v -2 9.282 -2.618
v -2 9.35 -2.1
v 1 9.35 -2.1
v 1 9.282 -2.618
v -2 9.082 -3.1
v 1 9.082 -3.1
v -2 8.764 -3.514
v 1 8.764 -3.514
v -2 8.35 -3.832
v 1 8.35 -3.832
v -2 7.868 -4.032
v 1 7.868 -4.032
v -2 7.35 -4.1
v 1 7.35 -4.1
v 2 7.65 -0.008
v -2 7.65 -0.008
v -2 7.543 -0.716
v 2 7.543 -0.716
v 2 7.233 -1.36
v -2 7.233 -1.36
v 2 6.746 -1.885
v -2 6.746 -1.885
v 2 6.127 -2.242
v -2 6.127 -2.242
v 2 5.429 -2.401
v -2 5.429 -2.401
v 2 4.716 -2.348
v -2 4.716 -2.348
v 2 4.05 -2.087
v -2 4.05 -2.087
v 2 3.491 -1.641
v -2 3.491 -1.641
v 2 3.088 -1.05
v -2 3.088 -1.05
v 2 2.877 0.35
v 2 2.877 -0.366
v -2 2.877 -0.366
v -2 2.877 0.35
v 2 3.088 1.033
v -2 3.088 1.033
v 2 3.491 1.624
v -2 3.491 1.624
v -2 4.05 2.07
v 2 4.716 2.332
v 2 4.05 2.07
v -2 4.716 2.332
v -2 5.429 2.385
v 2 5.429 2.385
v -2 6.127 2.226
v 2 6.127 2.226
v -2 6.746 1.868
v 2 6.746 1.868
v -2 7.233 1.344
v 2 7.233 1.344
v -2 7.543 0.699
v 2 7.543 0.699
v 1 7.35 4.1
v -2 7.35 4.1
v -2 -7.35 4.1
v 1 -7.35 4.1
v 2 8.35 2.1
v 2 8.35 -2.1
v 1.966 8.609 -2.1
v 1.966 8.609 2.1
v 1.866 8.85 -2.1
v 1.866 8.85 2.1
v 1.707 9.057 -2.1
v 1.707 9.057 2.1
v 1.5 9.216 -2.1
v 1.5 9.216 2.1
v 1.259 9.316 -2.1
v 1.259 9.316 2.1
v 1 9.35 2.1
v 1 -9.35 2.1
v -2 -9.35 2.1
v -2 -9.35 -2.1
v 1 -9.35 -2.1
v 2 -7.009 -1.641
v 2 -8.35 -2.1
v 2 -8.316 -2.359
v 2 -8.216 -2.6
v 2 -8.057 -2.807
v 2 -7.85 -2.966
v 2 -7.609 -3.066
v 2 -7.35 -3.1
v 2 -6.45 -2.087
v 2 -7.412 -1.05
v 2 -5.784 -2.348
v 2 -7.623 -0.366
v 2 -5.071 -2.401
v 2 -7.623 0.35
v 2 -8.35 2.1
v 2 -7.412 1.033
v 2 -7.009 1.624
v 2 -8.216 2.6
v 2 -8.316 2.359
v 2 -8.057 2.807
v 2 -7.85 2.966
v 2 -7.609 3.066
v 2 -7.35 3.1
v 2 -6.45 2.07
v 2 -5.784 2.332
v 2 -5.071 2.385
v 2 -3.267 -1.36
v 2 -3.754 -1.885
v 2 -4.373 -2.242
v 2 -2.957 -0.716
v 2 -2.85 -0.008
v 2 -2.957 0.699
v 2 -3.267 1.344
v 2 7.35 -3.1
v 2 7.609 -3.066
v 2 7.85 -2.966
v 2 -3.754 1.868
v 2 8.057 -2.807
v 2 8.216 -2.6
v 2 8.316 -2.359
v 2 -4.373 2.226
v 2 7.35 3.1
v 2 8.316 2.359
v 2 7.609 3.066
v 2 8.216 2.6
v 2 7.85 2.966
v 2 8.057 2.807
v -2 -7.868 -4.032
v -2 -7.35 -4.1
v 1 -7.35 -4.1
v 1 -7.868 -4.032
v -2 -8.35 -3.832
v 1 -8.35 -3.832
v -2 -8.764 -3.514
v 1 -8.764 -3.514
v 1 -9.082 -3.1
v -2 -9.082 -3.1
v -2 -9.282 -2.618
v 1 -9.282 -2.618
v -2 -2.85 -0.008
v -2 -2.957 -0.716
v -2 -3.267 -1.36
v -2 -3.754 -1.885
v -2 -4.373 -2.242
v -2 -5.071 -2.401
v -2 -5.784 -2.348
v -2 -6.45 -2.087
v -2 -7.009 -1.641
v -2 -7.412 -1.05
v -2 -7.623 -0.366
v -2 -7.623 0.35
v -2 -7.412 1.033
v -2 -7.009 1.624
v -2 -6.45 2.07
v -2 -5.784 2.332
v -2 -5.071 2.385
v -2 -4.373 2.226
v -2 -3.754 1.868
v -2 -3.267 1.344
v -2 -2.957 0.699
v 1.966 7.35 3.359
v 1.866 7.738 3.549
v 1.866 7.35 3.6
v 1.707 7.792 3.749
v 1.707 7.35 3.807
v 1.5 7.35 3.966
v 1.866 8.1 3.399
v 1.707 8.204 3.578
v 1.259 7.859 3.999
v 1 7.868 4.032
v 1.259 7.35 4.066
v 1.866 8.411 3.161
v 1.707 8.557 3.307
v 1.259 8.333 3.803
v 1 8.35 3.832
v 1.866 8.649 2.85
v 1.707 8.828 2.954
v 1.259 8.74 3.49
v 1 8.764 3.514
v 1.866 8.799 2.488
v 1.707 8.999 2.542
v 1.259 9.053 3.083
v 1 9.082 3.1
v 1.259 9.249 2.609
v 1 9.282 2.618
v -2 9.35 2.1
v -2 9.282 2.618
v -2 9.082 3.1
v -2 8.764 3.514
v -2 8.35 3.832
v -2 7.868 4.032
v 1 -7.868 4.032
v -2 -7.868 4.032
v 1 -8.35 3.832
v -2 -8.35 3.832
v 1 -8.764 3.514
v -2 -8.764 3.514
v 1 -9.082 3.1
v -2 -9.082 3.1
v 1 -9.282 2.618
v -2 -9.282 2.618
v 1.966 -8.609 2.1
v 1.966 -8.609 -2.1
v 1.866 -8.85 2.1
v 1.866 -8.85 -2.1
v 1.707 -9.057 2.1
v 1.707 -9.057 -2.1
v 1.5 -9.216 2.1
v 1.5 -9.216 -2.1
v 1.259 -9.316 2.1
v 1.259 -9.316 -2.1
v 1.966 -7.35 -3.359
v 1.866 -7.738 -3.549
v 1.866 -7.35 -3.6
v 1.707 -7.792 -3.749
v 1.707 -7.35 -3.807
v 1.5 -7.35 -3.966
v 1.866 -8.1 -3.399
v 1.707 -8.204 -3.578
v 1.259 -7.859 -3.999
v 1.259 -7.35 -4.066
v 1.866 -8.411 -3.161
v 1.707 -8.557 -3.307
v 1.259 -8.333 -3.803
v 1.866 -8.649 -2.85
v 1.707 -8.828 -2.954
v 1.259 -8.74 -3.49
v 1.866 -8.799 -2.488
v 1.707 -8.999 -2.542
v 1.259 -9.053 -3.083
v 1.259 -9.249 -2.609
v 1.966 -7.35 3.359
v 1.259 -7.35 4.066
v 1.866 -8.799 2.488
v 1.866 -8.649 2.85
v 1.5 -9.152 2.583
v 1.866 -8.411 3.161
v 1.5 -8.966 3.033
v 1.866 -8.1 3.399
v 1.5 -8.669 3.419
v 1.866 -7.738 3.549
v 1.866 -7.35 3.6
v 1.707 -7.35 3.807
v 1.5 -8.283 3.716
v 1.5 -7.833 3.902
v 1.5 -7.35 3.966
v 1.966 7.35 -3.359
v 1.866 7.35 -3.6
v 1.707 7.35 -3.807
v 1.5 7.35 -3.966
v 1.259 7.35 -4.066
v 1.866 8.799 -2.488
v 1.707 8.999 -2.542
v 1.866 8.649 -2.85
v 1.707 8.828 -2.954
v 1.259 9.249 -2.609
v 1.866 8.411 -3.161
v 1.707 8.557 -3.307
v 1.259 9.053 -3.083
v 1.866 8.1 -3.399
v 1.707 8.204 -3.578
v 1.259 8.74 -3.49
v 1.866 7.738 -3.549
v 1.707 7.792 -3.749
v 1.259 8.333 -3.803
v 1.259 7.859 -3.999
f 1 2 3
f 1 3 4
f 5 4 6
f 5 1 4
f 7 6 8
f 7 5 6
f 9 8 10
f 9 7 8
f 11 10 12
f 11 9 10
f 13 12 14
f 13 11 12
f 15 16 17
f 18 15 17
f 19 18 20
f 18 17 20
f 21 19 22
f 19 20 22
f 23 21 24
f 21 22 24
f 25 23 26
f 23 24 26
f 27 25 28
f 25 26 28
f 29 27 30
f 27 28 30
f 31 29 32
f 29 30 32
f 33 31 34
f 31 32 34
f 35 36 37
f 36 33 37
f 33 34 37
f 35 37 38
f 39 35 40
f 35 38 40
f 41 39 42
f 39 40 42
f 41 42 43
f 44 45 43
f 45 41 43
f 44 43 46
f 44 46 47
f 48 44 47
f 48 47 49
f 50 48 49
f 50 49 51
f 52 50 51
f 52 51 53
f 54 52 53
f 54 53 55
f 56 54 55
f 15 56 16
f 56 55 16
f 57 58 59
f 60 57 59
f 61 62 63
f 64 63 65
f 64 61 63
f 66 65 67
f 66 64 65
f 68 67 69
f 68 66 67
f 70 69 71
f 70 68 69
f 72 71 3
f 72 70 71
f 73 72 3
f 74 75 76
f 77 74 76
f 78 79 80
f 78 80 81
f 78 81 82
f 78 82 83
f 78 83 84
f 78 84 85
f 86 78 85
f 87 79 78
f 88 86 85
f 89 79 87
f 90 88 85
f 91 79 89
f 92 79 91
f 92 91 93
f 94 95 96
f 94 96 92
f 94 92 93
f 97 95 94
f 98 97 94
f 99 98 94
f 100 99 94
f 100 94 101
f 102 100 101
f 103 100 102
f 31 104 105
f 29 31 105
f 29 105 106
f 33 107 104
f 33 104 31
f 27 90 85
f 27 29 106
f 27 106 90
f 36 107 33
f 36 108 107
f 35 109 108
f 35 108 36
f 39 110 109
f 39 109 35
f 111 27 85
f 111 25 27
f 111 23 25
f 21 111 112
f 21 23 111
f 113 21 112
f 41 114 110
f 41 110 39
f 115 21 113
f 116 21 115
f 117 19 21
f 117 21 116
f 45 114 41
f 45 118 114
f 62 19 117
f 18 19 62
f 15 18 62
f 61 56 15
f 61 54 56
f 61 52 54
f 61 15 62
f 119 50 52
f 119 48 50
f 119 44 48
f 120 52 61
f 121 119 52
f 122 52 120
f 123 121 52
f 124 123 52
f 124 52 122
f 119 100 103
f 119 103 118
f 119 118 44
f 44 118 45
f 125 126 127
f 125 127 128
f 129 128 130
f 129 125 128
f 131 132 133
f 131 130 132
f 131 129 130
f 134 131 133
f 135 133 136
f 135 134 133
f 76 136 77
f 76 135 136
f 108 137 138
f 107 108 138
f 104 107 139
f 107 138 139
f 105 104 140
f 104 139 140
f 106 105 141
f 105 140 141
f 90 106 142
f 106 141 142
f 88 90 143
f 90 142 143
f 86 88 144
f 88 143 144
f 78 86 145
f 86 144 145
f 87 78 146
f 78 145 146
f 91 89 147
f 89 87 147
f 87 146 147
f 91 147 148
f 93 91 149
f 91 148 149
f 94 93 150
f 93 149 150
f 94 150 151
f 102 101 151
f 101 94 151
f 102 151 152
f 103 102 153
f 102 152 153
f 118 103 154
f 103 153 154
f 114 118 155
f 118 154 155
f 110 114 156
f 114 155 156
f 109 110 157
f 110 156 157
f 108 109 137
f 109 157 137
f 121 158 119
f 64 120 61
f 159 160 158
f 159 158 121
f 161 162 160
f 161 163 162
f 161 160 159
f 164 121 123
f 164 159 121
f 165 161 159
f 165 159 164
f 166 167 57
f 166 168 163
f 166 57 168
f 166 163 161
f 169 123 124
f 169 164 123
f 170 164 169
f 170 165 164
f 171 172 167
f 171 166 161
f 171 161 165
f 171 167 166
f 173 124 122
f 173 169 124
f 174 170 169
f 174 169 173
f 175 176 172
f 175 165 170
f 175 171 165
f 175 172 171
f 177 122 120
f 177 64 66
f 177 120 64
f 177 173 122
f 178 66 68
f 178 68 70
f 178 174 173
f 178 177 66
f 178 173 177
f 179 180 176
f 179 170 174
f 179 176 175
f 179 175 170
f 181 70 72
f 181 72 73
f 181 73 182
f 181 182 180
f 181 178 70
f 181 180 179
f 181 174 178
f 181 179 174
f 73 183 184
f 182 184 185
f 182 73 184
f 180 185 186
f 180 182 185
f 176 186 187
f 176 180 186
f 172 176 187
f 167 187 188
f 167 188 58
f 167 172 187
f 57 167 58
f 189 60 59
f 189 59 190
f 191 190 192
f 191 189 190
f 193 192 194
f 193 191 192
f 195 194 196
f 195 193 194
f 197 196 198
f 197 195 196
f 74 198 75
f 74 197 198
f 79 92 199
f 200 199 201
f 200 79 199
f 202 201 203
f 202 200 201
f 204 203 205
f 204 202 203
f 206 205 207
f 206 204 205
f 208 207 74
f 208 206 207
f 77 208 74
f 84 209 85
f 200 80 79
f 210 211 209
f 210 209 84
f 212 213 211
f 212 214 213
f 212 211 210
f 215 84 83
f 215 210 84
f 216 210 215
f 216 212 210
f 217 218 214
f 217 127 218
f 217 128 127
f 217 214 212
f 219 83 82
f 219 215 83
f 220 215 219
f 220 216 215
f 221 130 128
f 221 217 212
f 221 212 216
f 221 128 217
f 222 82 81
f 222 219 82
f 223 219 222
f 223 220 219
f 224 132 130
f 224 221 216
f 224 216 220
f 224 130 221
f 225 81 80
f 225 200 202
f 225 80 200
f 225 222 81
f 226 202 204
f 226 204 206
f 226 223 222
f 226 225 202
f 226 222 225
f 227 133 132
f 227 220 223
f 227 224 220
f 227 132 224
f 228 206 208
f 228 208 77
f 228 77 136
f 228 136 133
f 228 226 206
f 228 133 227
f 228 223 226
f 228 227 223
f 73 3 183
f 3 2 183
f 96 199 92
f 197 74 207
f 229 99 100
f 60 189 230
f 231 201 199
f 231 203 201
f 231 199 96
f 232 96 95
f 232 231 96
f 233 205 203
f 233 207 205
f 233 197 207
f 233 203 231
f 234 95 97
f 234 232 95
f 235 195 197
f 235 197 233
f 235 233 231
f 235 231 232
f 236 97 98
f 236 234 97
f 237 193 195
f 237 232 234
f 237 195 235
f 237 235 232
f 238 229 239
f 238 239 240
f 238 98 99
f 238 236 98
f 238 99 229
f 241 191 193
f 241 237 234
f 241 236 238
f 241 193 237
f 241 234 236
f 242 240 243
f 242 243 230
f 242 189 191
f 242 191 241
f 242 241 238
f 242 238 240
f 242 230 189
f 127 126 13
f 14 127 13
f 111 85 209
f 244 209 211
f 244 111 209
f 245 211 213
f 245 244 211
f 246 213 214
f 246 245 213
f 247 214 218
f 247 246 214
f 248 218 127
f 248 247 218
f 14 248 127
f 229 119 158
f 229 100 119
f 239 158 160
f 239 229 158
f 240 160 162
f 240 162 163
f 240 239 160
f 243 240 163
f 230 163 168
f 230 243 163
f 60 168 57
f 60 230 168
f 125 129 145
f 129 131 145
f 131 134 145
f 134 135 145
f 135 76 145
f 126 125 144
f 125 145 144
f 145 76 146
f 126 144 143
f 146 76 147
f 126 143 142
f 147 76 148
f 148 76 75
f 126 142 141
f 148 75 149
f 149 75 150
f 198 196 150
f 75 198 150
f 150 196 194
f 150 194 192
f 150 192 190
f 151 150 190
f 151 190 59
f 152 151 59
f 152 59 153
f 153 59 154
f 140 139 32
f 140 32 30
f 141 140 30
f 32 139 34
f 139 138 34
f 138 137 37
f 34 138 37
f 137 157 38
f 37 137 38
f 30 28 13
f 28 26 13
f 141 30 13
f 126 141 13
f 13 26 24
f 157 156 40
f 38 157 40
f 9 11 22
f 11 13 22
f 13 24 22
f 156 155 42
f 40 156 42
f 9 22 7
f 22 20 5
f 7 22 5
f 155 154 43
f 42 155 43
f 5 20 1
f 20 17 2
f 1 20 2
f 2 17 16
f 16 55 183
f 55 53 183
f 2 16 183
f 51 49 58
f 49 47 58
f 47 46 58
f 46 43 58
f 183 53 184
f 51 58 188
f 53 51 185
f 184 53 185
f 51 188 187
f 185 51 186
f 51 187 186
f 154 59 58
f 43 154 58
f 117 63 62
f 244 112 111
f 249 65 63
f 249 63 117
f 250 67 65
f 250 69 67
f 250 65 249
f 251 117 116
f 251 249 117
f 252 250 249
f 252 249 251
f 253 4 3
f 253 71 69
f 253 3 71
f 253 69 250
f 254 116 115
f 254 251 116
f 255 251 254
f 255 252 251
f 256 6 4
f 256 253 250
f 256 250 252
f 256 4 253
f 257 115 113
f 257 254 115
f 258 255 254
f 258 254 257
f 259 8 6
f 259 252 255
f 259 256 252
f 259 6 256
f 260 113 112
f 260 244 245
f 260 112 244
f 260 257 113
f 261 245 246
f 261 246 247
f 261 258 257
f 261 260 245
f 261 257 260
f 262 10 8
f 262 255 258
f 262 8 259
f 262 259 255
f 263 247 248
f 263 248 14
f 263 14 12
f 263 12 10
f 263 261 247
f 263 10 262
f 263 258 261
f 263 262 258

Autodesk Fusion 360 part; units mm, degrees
sketch "Sketch1" plane through (0, 0, 0) normal (1, 0, 0) x (0, 1, 0) in component "probe_retainer_bracket"
  line L0 (9.35, 4.1) -> (-9.35, 4.1)
  line L1 (-9.35, 4.1) -> (-9.35, -4.1)
  line L2 (-9.35, -4.1) -> (9.35, -4.1)
  line L3 (9.35, -4.1) -> (9.35, 4.1)
  line L4 (9.35, 4.1) -> (-9.35, -4.1) construction
  line L5 (-9.35, 4.1) -> (9.35, -4.1) construction
  circle A0 centre (-5.25, -0.0082) radius 2.4
  line L6 (0, 0) -> (-10.0428, -0.0157) construction
  line L7 (0, 0) -> (0, 6) construction
  circle A1 centre (5.25, -0.0082) radius 2.4
  dimension "d1" = 18.7
  dimension "d2" = 8.2
  dimension "d3" = 4.8
  dimension "d4" = 10.5
extrude "Extrude1" add sketch "Sketch1" along normal mid plane 4 in component "probe_retainer_bracket"
fillet "Fillet1" radius 2 4 edges at (0, -9.35, 4.1) (0, 9.35, 4.1) (0, -9.35, -4.1) (0, 9.35, -4.1) in component "probe_retainer_bracket"
fillet "Fillet2" radius 1 8 edges at (2, -8.7642, 3.5142) (2, -9.35, 0) (2, -8.7642, -3.5142) (2, 0, -4.1) (2, 8.7642, -3.5142) (2, 9.35, 0) (2, 8.7642, 3.5142) (2, 0, 4.1) in component "probe_retainer_bracket"
component "probe_retainer_bracket" placed x (1, 0, 0) y (0, 1, 0) z (0, 0, 1) at (0, 0, 0)
